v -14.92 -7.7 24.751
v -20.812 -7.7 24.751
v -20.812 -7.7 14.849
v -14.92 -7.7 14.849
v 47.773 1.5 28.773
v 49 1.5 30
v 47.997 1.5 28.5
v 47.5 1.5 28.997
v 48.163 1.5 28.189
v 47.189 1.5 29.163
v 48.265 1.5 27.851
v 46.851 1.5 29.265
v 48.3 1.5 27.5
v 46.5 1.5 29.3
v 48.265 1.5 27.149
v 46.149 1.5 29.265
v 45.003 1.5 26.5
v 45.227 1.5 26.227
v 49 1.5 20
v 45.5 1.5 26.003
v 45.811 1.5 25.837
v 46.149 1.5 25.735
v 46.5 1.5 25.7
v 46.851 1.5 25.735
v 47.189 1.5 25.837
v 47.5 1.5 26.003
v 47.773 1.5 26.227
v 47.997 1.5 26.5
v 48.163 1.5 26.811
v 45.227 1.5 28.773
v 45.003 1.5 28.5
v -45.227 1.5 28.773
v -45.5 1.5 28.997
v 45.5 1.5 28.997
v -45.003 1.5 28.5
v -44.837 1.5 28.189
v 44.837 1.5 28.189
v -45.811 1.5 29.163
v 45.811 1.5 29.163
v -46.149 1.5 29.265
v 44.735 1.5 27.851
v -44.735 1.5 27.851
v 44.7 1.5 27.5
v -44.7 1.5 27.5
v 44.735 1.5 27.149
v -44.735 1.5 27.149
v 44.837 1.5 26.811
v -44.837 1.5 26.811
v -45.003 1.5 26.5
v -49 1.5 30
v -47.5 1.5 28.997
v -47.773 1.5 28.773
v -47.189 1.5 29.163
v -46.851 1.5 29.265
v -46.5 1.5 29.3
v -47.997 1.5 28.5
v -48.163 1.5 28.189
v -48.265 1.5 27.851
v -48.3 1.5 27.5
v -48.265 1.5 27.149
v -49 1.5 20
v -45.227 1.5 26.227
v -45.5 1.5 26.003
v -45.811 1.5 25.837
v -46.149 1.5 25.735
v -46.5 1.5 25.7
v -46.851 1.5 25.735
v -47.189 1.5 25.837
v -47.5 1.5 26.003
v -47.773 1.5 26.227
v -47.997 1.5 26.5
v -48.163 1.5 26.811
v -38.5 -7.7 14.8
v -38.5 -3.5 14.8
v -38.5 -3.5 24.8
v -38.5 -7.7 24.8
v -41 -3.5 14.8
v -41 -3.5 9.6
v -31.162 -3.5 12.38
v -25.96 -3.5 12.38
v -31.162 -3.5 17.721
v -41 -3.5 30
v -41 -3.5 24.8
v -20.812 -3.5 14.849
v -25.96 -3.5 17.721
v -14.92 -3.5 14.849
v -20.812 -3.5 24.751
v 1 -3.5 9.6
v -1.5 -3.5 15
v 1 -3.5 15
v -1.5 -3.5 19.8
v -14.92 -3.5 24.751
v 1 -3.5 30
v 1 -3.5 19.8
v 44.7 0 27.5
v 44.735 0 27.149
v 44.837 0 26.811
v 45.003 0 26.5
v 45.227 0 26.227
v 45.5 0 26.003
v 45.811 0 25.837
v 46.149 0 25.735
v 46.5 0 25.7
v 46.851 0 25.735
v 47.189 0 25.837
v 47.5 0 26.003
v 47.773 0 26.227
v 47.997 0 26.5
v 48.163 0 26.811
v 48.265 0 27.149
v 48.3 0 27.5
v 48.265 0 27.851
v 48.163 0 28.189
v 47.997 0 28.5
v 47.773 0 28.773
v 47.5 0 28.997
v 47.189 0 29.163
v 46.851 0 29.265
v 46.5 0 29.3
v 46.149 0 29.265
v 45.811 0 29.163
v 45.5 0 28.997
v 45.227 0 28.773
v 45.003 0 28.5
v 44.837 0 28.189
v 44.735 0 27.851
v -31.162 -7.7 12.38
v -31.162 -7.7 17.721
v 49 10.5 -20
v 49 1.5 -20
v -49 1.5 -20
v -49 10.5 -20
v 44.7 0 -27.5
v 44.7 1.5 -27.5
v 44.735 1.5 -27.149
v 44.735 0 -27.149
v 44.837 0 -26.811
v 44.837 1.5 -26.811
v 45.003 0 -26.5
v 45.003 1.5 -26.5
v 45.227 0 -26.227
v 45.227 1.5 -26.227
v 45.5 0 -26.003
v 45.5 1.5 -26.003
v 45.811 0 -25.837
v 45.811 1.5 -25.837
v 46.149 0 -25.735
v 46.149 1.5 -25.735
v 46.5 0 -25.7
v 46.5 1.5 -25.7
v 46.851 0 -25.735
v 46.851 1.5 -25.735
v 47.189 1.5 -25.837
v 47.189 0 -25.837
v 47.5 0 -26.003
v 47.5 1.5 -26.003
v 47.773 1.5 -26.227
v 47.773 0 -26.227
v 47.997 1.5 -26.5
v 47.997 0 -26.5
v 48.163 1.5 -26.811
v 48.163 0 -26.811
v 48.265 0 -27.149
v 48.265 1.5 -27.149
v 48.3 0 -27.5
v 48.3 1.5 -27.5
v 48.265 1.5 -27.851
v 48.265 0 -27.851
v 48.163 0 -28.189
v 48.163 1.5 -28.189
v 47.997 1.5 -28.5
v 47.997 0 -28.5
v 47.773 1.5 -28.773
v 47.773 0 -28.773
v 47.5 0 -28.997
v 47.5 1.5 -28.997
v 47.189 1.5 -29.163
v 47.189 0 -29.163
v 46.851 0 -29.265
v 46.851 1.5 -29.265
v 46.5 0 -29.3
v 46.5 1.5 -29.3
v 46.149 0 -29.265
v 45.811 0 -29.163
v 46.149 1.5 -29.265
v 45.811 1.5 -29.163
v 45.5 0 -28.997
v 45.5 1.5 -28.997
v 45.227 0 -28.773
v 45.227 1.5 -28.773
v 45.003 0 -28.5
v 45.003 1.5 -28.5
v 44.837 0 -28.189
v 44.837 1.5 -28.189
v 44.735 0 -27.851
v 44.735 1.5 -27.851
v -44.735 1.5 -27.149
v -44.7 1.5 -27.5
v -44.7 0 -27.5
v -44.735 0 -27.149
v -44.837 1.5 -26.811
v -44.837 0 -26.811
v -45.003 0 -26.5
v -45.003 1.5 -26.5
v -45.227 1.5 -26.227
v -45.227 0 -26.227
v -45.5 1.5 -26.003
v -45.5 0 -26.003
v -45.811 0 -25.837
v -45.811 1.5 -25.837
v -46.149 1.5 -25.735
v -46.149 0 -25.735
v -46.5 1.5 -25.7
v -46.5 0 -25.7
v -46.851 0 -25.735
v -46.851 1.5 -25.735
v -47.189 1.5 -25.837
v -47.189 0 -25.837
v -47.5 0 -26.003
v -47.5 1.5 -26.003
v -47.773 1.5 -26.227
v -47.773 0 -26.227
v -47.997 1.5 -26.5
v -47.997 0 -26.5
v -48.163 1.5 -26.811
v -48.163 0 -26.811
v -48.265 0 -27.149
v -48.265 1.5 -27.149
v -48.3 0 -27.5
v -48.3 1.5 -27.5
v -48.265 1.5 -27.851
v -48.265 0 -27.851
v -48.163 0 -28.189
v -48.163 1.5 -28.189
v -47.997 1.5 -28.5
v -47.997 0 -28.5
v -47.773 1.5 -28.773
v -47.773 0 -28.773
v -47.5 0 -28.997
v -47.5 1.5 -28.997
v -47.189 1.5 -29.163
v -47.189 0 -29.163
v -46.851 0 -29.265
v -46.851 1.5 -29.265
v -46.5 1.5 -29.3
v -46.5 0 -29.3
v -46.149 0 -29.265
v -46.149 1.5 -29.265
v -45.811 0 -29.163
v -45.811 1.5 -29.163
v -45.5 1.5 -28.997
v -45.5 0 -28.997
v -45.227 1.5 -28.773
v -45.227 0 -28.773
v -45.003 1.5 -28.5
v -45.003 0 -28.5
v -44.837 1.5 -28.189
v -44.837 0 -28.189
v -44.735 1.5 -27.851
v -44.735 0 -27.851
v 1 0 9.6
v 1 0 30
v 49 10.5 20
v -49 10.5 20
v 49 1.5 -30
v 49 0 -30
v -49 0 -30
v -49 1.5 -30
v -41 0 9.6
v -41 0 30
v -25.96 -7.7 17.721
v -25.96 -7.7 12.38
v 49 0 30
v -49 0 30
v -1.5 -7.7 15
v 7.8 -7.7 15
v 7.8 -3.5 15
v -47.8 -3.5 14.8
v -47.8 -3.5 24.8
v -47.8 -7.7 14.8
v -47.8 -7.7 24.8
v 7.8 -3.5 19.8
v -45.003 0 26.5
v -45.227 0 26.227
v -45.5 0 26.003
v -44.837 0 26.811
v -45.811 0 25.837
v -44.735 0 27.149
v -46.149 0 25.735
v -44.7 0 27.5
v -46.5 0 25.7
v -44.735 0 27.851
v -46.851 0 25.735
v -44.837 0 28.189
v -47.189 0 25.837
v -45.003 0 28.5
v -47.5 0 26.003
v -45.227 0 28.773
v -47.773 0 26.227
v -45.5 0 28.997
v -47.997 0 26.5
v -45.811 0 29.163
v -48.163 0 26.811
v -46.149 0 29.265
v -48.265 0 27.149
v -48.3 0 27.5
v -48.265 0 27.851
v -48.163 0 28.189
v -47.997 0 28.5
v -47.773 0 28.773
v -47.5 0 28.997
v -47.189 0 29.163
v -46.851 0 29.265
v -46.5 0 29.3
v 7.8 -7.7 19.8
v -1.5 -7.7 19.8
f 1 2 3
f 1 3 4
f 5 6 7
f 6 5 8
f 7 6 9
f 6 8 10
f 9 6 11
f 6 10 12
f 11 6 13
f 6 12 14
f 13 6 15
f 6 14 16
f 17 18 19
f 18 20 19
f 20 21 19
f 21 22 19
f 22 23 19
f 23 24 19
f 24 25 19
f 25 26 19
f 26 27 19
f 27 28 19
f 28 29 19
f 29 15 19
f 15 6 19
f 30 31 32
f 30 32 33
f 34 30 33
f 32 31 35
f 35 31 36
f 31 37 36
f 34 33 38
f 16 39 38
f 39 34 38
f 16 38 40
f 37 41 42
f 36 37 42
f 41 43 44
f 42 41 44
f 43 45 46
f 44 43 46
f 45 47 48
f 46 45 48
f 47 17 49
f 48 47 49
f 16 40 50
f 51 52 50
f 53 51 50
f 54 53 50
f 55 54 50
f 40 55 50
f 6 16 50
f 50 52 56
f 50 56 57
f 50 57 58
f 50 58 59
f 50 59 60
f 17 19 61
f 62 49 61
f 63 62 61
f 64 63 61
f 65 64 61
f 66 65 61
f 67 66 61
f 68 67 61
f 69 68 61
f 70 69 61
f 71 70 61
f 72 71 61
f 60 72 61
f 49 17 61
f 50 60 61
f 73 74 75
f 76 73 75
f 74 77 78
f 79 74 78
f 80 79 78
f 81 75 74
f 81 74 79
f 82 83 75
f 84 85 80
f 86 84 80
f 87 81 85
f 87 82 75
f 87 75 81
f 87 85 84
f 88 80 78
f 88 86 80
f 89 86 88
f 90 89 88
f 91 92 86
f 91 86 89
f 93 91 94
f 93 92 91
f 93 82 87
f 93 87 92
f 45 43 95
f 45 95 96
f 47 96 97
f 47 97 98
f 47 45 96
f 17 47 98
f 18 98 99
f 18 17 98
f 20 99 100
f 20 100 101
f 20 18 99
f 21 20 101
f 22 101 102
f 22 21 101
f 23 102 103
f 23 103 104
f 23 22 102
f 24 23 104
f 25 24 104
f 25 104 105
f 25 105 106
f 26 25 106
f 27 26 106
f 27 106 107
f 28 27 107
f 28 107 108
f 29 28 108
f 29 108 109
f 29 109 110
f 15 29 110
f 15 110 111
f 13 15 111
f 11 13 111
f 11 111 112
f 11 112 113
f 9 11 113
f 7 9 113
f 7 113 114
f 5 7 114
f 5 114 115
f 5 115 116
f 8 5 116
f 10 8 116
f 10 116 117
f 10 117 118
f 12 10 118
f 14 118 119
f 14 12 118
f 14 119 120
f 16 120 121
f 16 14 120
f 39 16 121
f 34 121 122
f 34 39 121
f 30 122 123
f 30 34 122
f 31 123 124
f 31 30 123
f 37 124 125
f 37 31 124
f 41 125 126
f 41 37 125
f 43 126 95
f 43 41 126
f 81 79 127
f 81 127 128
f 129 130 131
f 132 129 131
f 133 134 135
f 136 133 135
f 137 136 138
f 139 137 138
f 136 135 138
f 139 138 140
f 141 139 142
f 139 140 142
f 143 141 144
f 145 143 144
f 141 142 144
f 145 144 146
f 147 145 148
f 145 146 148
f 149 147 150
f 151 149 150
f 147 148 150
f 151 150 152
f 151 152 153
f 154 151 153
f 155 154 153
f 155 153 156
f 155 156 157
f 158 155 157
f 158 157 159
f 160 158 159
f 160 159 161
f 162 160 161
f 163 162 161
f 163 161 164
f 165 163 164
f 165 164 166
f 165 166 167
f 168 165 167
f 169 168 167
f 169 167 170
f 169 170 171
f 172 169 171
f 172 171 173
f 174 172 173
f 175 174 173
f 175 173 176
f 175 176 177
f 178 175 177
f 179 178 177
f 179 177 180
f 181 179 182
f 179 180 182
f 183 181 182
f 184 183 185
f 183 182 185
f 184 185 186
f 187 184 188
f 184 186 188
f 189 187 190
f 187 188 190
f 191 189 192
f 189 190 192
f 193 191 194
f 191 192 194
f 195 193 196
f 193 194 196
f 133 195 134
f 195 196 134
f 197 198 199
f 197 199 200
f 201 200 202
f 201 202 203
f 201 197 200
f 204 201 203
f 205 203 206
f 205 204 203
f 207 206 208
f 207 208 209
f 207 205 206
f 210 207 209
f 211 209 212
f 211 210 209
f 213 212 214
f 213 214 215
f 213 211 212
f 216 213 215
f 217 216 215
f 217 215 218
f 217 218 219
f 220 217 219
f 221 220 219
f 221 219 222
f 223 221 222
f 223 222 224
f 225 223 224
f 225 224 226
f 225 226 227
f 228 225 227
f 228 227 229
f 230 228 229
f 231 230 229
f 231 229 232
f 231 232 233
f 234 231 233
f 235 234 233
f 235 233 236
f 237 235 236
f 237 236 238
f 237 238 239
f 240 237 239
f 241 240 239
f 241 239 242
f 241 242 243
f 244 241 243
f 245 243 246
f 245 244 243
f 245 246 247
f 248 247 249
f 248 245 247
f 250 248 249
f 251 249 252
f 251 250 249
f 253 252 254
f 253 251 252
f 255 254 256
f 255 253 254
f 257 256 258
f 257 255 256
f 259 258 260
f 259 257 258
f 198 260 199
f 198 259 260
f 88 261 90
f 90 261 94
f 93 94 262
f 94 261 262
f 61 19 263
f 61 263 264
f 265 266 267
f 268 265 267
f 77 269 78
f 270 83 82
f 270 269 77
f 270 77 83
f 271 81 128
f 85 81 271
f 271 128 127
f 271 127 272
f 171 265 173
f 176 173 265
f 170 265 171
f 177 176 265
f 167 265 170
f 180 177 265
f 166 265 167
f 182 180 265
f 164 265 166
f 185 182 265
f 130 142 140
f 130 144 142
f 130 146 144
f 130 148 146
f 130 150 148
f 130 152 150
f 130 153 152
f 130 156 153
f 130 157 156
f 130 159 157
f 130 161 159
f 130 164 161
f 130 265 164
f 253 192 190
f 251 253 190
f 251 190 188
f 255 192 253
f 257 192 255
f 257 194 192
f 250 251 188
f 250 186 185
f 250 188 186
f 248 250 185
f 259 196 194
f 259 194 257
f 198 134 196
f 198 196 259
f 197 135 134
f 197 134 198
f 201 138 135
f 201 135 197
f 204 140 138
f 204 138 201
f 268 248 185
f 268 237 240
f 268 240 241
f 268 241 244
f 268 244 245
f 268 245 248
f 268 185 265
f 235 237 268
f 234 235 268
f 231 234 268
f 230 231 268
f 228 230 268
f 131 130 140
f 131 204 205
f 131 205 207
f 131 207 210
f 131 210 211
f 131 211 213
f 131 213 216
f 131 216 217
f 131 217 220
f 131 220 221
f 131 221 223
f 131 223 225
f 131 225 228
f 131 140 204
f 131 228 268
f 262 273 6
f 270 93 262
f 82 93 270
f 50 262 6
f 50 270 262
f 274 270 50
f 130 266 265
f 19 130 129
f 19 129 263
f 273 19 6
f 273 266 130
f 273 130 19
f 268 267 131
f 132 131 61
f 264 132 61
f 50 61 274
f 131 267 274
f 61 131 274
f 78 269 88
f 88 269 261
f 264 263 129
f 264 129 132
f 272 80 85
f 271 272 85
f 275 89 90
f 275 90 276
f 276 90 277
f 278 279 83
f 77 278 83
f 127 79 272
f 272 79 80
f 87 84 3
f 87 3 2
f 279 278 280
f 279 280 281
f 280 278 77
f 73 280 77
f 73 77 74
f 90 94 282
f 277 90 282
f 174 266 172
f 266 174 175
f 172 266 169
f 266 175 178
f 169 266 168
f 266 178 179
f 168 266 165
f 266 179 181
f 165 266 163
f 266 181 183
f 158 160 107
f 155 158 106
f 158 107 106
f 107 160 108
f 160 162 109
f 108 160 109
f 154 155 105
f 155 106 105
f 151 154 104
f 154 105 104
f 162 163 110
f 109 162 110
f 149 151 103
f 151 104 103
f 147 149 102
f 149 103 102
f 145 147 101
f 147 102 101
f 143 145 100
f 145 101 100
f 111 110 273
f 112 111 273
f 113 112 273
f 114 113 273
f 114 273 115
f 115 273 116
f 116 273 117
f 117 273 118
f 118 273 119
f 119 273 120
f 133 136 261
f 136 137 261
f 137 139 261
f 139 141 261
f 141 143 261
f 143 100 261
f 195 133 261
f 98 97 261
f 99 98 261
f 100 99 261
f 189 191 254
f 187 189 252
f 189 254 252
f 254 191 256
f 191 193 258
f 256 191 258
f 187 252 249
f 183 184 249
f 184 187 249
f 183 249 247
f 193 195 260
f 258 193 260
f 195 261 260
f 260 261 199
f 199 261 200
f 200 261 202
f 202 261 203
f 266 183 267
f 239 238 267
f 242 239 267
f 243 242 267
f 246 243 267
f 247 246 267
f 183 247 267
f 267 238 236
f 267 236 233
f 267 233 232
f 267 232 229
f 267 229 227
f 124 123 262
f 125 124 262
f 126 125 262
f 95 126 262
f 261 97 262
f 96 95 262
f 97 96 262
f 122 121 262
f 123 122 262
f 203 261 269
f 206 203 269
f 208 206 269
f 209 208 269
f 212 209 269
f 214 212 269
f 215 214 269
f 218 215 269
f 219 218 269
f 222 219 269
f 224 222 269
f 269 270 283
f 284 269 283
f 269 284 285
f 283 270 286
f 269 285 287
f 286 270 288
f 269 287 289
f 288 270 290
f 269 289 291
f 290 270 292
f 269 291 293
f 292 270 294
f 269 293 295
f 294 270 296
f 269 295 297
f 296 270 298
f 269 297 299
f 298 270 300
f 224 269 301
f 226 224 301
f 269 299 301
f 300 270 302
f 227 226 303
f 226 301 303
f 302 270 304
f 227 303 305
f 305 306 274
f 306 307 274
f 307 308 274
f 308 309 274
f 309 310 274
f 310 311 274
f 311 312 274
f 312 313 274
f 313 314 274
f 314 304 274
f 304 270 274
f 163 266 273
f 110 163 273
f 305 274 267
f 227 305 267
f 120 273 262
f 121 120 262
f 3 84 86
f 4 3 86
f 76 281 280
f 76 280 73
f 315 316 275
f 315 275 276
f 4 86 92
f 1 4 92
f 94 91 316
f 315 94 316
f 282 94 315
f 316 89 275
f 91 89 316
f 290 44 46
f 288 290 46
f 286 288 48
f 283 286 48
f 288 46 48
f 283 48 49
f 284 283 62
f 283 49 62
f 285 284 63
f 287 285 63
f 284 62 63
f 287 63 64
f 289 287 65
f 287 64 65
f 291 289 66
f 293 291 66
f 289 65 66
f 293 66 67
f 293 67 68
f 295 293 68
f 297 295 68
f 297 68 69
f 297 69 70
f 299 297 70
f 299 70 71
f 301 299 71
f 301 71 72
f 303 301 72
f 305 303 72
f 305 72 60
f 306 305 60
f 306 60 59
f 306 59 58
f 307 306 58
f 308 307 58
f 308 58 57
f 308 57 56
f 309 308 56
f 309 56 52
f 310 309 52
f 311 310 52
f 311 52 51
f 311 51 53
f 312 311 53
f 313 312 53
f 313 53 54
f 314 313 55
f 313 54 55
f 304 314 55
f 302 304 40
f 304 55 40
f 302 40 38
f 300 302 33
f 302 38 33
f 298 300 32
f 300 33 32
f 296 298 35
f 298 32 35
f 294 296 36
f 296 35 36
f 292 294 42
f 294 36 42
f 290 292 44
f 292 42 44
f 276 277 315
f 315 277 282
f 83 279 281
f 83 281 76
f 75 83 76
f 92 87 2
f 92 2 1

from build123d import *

# Parameters (mm, degrees)
SKIZZE1_W                            = 49
SKIZZE1_H                            = 30
AUFSATZ_LINEAR_AUSTRAGEN1_DEPTH      = 1.5
SKIZZE2_W                            = 49
SKIZZE2_H                            = 20
AUFSATZ_LINEAR_AUSTRAGEN2_DEPTH      = 9
SKIZZE3_R                            = 1.8
SCHNITT_LINEAR_AUSTRAGEN1_DEPTH      = 10
SCHNITT_LINEAR_AUSTRAGEN1_DEPTH_BACK = 2.5
SKIZZE4_W                            = 42
SKIZZE4_H                            = 20.4
AUFSATZ_LINEAR_AUSTRAGEN3_DEPTH      = 3.5
SKIZZE5_W                            = 9.3
SKIZZE5_H                            = 10
SKIZZE5_W_2                          = 5.202111929
SKIZZE5_H_2                          = 5.340958118
SKIZZE5_W_3                          = 5.892281305
SKIZZE5_H_3                          = 9.90280044
SKIZZE5_H_4                          = 4.8
AUFSATZ_LINEAR_AUSTRAGEN4_DEPTH      = 4.2


with BuildPart() as part:
    # Skizze1 → Aufsatz-Linear austragen1 (new body)
    with BuildSketch(Plane(origin=(0, 0, 0), x_dir=(1, 0, 0), z_dir=(0, 1, 0))):
        with Locations((-24.5, -15)):
            Rectangle(SKIZZE1_W, SKIZZE1_H)
    extrude(amount=AUFSATZ_LINEAR_AUSTRAGEN1_DEPTH)

    # Skizze2 → Aufsatz-Linear austragen2 (add)
    with BuildSketch(Plane(origin=(0, 1.5, 0), x_dir=(1, 0, 0), z_dir=(0, 1, 0))):
        with Locations((-24.5, -10)):
            Rectangle(SKIZZE2_W, SKIZZE2_H)
    extrude(amount=AUFSATZ_LINEAR_AUSTRAGEN2_DEPTH)

    # Skizze3 → Schnitt-Linear austragen1 (cut, two sides)
    with BuildSketch(Plane(origin=(0, 1.5, 0), x_dir=(1, 0, 0), z_dir=(0, 1, 0))) as schnitt_linear_austragen1_sk:
        with Locations((-46.5, -27.5)):
            Circle(SKIZZE3_R)
    extrude(amount=SCHNITT_LINEAR_AUSTRAGEN1_DEPTH, mode=Mode.SUBTRACT)
    extrude(schnitt_linear_austragen1_sk.sketch, amount=-SCHNITT_LINEAR_AUSTRAGEN1_DEPTH_BACK, mode=Mode.SUBTRACT)

    # Spiegeln1: part across plane


with BuildPart() as part_1:
    add(part.part)
    add(part.part.mirror(Plane(origin=(0, 1.5, 0), x_dir=(0, 0, 1), z_dir=(-1, 0, 0))))

    # Spiegeln2: part across plane


with BuildPart() as part_2:
    add(part_1.part)
    add(part_1.part.mirror(Plane(origin=(0, 1.5, 0), x_dir=(1, 0, 0), z_dir=(0, 0, 1))))

    # Skizze4 → Aufsatz-Linear austragen3 (add)
    with BuildSketch(Plane.XZ):
        with Locations((-20, 19.8)):
            Rectangle(SKIZZE4_W, SKIZZE4_H)
    extrude(amount=AUFSATZ_LINEAR_AUSTRAGEN3_DEPTH)

    # Skizze5 → Aufsatz-Linear austragen4 (add)
    with BuildSketch(Plane.XZ.offset(3.5)):
        with Locations((-43.15, 19.8)):
            Rectangle(SKIZZE5_W, SKIZZE5_H)
        with Locations((-28.561234427, 15.050145035)):
            Rectangle(SKIZZE5_W_2, SKIZZE5_H_2)
        with Locations((-17.866219882, 19.8)):
            Rectangle(SKIZZE5_W_3, SKIZZE5_H_3)
        with Locations((3.15, 17.4)):
            Rectangle(SKIZZE5_W, SKIZZE5_H_4)
    extrude(amount=AUFSATZ_LINEAR_AUSTRAGEN4_DEPTH)


solid = part_2.part
